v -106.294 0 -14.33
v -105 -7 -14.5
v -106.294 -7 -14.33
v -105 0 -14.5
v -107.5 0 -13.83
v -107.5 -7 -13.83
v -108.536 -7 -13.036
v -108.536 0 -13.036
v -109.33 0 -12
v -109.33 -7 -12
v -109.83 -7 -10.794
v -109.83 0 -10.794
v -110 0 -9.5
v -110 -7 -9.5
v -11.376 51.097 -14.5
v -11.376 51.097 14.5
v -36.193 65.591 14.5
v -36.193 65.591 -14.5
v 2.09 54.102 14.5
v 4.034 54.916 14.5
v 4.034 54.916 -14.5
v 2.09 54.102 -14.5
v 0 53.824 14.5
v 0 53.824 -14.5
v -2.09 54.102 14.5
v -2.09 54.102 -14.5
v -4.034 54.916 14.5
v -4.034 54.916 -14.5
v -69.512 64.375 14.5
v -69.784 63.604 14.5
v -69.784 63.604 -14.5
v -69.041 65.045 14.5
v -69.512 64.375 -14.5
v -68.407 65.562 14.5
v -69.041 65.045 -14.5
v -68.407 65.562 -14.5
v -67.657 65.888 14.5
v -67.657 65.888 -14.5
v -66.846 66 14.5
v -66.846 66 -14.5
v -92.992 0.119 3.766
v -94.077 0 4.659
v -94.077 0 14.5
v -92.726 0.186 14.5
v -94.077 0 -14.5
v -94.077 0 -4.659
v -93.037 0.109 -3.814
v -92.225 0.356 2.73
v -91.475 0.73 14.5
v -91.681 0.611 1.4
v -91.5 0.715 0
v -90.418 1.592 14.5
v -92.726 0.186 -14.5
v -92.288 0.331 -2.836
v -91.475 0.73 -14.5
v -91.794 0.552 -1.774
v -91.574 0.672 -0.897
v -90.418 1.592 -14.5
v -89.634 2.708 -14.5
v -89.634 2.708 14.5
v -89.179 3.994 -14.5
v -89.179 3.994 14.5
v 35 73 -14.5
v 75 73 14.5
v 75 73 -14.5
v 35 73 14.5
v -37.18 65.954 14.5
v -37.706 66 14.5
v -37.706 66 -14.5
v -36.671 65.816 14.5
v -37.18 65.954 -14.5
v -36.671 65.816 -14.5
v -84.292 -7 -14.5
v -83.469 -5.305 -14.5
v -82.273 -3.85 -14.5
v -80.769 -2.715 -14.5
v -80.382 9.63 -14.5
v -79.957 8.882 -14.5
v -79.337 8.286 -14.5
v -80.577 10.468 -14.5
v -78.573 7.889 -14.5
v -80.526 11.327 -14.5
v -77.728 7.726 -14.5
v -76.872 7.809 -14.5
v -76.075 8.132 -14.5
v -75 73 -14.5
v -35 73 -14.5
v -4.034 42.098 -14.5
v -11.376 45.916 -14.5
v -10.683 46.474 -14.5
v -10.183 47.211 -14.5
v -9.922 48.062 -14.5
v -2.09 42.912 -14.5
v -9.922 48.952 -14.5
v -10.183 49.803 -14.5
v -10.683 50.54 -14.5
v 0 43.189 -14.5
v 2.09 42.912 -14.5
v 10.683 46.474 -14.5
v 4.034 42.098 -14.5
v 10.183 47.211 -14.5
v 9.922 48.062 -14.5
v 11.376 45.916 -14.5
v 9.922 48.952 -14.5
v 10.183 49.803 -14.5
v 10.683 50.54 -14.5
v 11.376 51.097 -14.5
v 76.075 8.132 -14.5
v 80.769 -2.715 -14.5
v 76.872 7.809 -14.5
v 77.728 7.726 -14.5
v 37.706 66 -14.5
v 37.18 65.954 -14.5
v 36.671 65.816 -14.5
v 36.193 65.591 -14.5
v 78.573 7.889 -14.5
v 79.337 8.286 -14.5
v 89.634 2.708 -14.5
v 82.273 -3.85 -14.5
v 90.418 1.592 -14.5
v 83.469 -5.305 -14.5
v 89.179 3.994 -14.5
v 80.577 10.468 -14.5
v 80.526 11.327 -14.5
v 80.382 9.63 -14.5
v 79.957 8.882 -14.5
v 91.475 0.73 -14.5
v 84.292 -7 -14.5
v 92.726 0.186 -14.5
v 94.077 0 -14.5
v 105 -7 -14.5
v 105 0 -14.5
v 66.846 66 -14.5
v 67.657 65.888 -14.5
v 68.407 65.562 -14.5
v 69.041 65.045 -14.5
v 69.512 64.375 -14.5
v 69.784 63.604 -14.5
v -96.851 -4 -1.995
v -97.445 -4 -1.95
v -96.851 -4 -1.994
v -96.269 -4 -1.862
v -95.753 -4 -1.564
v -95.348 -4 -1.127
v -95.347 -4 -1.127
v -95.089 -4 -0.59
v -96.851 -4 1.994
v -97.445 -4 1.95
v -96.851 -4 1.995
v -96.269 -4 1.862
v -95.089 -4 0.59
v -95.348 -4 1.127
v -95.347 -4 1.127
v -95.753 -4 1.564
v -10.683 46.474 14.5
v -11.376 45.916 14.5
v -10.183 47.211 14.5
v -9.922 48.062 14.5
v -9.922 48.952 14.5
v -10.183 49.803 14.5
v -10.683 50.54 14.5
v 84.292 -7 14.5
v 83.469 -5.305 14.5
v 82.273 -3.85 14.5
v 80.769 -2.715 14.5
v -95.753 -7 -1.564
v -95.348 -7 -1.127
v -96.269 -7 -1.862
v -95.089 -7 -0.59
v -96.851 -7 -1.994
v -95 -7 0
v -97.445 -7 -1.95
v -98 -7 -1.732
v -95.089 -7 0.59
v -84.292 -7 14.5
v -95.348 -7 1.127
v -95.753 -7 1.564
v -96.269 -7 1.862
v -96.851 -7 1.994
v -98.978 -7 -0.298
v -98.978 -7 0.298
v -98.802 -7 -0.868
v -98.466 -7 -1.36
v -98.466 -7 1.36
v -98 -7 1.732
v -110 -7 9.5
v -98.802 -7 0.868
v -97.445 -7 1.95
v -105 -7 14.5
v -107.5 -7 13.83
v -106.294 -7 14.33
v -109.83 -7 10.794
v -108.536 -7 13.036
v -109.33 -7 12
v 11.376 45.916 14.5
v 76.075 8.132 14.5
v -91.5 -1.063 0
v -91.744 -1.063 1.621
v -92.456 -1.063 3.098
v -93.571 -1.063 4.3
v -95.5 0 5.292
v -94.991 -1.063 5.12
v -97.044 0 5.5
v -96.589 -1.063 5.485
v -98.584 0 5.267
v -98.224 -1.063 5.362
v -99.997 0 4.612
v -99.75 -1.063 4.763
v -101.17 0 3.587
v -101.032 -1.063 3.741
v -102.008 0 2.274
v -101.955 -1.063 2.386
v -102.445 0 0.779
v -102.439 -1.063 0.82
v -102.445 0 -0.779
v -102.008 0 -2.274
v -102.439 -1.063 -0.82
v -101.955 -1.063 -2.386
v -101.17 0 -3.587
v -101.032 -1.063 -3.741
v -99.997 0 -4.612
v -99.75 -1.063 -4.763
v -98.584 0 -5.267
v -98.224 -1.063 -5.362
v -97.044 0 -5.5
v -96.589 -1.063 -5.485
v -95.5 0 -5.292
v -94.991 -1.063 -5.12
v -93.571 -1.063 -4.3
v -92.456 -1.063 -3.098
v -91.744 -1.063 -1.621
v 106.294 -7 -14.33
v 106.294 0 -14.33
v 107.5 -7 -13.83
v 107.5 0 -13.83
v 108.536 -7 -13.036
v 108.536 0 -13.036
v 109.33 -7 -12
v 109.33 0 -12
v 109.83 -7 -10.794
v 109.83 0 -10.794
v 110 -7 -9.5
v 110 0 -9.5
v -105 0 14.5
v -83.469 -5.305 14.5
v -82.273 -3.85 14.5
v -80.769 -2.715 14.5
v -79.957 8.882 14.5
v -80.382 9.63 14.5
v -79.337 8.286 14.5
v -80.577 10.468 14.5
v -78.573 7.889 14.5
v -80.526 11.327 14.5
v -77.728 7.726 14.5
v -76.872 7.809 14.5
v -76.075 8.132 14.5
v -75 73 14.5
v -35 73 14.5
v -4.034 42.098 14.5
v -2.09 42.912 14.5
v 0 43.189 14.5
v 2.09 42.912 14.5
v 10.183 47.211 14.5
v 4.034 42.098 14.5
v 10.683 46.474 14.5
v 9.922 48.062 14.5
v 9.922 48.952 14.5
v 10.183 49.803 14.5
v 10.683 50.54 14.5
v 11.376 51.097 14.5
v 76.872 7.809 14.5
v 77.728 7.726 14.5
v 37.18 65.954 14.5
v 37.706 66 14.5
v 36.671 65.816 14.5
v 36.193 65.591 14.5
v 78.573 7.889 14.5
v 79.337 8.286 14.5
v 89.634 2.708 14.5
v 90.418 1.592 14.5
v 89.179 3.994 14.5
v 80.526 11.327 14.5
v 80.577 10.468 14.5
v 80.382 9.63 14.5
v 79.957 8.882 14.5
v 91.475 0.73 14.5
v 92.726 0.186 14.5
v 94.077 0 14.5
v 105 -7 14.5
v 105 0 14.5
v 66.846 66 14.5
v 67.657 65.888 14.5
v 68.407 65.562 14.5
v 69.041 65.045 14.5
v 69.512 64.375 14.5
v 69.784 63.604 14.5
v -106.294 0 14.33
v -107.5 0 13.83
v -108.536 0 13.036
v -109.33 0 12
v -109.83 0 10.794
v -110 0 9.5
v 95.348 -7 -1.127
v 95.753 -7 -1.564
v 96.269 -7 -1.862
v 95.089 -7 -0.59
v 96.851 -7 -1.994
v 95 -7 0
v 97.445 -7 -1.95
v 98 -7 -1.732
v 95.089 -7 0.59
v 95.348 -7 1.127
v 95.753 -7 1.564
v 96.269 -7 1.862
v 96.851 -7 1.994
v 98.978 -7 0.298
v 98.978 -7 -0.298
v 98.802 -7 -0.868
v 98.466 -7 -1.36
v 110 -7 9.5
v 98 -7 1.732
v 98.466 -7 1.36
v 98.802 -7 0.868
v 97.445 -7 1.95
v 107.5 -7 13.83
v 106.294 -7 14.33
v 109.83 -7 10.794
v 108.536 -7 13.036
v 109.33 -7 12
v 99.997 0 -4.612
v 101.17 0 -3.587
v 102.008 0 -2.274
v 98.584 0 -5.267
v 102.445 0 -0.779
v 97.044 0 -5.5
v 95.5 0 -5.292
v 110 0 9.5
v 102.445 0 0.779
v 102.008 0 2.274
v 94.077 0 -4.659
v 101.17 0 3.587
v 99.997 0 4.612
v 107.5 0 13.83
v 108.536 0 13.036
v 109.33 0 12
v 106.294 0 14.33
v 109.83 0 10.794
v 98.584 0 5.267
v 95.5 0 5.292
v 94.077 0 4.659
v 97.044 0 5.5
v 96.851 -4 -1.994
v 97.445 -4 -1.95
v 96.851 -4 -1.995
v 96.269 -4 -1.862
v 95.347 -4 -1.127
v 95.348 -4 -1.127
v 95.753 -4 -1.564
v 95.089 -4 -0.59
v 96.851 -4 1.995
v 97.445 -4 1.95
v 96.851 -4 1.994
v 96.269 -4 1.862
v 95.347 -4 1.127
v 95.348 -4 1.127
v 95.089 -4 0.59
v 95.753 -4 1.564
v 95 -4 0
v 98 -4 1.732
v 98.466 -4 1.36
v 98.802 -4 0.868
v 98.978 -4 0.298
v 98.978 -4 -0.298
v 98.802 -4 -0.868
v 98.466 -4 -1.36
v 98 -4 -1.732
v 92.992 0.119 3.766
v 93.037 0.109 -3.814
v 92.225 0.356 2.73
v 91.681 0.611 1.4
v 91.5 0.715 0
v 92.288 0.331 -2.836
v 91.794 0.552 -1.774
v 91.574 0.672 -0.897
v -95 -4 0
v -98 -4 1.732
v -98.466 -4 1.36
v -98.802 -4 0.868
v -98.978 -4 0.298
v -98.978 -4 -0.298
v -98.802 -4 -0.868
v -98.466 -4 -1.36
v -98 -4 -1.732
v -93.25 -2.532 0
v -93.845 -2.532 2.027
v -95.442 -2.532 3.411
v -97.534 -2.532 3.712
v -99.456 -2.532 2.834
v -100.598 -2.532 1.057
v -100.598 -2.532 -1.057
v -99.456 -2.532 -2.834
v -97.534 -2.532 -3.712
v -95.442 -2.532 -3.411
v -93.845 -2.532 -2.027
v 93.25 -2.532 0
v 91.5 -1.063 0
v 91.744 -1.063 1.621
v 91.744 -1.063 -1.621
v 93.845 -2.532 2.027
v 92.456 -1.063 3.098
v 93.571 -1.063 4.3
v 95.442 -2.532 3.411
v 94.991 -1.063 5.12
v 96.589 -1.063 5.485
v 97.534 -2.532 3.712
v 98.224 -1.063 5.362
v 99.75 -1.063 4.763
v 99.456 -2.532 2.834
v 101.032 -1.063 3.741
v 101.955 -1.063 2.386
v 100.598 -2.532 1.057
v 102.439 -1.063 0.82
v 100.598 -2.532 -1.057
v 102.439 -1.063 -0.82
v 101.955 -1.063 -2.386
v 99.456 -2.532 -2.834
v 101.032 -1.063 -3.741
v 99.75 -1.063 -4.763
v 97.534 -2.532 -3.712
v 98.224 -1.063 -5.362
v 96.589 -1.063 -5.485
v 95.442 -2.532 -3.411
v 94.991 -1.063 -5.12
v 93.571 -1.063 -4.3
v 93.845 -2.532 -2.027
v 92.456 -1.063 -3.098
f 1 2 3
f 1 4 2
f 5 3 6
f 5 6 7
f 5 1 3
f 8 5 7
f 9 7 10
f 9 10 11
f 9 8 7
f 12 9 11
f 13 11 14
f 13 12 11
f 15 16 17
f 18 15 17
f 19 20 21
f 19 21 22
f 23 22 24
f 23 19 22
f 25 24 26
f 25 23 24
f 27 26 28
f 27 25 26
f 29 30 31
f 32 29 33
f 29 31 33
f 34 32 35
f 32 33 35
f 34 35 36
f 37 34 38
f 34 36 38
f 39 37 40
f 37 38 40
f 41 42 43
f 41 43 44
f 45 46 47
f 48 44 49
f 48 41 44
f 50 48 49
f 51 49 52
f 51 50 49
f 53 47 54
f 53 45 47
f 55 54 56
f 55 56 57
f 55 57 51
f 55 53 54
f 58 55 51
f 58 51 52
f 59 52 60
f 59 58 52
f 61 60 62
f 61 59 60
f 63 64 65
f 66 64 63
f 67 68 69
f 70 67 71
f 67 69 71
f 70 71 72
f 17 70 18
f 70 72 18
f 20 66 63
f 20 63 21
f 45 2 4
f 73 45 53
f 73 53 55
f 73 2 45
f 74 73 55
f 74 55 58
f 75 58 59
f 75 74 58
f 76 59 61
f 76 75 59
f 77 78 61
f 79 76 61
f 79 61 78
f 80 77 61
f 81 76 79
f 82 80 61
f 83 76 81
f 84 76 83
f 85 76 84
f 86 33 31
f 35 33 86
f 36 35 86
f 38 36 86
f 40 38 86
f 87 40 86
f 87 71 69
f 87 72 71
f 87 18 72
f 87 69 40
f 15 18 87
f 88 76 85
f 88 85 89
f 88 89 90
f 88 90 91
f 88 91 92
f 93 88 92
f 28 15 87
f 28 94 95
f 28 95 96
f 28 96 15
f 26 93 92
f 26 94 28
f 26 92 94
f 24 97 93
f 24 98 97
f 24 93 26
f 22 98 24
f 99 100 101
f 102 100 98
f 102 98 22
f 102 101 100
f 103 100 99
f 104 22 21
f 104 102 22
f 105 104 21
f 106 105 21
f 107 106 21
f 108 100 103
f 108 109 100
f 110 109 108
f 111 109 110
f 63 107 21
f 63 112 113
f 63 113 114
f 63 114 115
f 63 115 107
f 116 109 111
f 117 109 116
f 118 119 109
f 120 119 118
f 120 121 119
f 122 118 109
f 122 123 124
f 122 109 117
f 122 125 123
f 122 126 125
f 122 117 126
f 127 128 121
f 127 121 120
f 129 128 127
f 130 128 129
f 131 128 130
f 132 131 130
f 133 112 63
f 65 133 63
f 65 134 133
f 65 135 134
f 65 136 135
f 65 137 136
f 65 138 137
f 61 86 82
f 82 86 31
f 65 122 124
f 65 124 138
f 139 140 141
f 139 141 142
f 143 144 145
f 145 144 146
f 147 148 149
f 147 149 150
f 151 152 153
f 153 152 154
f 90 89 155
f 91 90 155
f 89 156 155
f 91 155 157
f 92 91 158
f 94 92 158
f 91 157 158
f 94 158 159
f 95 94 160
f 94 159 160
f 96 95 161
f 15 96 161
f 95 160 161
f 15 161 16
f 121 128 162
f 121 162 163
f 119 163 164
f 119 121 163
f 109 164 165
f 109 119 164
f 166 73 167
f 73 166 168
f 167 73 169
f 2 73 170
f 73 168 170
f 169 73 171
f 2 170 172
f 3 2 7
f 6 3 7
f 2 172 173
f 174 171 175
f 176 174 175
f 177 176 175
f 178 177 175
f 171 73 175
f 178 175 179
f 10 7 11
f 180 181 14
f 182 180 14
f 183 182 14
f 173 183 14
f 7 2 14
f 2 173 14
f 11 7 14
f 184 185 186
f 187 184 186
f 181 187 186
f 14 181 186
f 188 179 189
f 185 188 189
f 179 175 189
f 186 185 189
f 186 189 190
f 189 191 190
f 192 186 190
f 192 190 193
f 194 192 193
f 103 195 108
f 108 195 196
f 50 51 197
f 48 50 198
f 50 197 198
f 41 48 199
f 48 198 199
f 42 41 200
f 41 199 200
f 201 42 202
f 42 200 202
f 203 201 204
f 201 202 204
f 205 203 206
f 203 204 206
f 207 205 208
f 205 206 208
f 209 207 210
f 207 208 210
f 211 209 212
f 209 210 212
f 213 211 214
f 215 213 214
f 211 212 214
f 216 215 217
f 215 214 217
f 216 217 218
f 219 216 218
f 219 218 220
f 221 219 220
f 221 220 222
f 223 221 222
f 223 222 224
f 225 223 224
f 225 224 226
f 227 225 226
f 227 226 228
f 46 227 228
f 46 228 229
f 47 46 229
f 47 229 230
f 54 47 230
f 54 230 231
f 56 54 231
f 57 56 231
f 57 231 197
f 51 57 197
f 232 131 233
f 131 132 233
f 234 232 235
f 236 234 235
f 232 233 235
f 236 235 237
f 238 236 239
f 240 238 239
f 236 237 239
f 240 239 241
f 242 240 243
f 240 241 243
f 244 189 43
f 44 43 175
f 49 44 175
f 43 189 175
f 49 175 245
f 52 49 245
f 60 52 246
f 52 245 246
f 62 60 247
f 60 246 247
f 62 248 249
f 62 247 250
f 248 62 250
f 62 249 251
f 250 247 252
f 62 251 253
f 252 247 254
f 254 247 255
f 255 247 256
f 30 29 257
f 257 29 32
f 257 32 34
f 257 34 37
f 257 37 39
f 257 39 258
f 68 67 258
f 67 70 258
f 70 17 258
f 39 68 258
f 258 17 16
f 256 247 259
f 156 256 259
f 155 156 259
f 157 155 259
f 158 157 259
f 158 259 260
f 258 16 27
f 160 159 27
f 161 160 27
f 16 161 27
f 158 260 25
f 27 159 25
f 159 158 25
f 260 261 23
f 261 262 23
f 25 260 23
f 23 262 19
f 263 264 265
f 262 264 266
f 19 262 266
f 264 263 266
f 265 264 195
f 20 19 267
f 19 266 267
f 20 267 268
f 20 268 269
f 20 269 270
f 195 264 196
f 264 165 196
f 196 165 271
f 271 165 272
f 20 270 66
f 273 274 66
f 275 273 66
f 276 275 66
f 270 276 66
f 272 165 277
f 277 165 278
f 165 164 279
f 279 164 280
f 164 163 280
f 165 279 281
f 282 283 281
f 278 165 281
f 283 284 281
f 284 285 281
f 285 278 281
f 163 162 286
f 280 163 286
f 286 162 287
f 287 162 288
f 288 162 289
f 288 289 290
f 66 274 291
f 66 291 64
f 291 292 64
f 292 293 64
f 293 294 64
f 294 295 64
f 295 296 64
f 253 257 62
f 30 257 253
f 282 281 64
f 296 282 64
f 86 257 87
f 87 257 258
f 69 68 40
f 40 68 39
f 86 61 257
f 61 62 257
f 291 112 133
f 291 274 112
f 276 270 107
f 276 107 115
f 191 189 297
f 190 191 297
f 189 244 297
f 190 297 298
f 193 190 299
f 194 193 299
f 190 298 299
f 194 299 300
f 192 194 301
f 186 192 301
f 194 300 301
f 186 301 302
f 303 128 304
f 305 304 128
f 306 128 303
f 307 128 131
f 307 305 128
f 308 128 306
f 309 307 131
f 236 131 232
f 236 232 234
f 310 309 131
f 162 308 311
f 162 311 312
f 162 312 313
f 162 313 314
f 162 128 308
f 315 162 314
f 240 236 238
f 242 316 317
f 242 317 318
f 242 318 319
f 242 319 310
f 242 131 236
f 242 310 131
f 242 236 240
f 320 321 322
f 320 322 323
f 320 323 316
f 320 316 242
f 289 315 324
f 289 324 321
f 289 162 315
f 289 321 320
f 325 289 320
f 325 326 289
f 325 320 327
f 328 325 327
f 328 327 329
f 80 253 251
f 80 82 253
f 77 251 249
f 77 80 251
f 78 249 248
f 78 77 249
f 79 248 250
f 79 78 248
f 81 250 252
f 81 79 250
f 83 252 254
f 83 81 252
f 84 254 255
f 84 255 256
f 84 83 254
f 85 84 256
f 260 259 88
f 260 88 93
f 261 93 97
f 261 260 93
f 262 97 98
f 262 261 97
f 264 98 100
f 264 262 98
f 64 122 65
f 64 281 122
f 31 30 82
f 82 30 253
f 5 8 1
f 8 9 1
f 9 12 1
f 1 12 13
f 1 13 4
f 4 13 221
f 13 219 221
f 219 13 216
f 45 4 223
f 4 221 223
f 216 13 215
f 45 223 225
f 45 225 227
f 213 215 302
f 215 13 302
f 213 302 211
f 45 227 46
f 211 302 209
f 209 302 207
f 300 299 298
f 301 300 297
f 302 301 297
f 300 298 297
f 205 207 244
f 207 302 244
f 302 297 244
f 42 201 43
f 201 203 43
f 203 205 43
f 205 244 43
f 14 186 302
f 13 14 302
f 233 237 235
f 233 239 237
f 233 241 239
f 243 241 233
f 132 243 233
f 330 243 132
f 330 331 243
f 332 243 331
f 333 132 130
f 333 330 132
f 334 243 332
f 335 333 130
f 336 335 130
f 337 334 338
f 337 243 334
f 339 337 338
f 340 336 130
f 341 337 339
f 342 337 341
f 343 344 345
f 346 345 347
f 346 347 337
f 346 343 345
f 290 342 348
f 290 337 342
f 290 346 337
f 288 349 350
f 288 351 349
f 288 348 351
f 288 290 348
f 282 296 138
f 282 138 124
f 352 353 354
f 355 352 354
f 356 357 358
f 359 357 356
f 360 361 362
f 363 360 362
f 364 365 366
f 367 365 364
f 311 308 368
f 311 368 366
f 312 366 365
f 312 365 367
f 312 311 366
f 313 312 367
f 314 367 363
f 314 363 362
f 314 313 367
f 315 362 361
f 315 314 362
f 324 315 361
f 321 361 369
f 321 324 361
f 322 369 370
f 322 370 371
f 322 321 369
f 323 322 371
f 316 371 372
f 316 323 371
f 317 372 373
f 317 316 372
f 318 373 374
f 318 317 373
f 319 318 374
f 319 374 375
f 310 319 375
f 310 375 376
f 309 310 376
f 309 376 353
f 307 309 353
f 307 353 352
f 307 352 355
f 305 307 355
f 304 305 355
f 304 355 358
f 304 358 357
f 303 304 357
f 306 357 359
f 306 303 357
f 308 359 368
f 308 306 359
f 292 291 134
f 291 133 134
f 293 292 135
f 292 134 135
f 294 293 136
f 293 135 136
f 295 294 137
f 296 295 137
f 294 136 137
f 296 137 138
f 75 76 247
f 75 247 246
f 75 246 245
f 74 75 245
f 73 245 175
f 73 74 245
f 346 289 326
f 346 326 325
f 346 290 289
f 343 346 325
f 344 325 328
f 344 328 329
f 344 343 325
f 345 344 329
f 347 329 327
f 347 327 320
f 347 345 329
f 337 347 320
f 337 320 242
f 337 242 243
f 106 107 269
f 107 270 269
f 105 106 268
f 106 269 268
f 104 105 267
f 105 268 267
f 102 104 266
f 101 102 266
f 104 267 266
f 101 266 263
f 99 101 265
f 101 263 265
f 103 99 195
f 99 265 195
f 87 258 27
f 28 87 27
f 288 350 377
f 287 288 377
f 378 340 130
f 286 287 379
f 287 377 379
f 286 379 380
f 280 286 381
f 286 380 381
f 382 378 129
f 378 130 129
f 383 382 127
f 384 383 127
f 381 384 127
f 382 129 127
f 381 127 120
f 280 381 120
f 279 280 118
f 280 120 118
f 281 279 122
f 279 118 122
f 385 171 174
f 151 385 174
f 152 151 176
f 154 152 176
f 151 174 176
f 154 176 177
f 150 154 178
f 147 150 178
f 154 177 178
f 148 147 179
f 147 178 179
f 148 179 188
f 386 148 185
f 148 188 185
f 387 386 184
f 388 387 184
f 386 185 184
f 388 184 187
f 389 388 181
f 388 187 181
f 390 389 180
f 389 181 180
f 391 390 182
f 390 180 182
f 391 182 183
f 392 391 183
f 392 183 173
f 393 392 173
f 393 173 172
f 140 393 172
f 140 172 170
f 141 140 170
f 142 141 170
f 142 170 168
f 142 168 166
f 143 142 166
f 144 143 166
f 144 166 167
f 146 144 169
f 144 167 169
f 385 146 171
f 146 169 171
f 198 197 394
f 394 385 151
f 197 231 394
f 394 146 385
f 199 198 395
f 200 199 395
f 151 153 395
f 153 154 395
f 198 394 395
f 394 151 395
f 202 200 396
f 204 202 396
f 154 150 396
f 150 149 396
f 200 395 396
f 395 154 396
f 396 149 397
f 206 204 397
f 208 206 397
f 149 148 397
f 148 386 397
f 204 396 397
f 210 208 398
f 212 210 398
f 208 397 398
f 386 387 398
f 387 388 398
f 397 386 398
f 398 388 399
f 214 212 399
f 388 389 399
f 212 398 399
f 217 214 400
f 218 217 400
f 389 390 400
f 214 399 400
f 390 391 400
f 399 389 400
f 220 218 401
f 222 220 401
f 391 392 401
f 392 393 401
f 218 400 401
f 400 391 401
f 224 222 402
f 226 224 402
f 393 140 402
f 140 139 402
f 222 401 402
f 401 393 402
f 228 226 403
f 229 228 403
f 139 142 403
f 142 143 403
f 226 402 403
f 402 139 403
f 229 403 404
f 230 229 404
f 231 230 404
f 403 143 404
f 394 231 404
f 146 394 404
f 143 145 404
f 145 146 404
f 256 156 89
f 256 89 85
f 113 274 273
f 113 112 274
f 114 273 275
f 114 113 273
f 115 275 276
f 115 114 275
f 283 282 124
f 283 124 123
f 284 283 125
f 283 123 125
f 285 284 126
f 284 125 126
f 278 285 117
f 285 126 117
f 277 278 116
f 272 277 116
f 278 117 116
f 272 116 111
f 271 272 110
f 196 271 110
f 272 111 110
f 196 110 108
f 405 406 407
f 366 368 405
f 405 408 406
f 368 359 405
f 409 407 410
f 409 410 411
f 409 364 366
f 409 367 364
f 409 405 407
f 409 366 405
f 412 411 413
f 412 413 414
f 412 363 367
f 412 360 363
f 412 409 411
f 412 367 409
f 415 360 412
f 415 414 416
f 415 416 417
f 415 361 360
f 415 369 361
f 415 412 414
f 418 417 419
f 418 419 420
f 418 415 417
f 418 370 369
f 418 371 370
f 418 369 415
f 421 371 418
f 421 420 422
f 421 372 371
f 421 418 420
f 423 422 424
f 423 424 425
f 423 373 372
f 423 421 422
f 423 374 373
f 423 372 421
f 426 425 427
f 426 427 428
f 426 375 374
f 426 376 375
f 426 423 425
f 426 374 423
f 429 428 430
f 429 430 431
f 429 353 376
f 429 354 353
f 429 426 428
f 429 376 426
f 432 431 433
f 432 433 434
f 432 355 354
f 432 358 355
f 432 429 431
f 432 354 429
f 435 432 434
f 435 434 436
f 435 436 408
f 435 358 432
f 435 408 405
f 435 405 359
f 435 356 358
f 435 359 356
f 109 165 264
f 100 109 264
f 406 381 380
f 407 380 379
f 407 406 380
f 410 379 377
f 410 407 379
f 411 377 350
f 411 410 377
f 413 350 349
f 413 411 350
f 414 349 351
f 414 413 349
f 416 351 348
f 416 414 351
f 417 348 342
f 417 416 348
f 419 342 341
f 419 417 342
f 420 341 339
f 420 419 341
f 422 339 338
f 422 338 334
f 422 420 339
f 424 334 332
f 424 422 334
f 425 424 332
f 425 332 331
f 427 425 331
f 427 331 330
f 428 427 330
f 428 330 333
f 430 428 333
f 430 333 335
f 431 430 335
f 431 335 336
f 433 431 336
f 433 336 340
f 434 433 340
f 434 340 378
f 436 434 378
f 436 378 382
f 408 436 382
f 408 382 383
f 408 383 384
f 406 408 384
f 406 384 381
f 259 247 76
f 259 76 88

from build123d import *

# Parameters (mm, degrees)
EXTRU_MINCE1_DEPTH      = 14.5
CONG_1_R                = 5
CONG_2_R                = 5
ESQUISSE4_R             = 2
ENL_V_MAT_EXTRU_1_DEPTH = 3
ESQUISSE5_R             = 5.5
ENL_V_MAT_EXTRU_2_DEPTH = 136.052767465
CHANFREIN1_SIZE2        = 3.5
CHANFREIN1_SIZE         = 2.936848709
CONG_3_R                = 8
CONG_4_R                = 3


# Some blends are built 0.0001 mm under size
with BuildPart() as part:
    # Esquisse1 → Extru.-Mince1 (new, symmetric)
    with BuildSketch(Plane.XY):
        Polygon((-110, 0), (-90, 0), (-75, 73), (-35, 73), (90, 0), (86.469896568, -6.044697657), (-36.894311748, 66), (-69.292107606, 66), (-84.292107606, -7), (-110, -7), align=None)
    extrude(amount=EXTRU_MINCE1_DEPTH, both=True)

    # Congé1
    cong_1_edges = [part.edges().sort_by_distance(p)[0] for p in [
        (-110, -3.5, 14.5),
        (-110, -3.5, -14.5),
    ]]
    fillet(cong_1_edges, radius=CONG_1_R)

    # Congé2
    cong_2_edges = [part.edges().sort_by_distance(p)[0] for p in [
        (-90, 0, 0),
    ]]
    fillet(cong_2_edges, radius=CONG_2_R)

    # Esquisse4 → Enlèv. mat.-Extru.1 (cut)
    with BuildSketch(Plane.XZ.offset(7)):
        with Locations((-97, 0)):
            Circle(ESQUISSE4_R)
    extrude(amount=-ENL_V_MAT_EXTRU_1_DEPTH, mode=Mode.SUBTRACT)

    # Esquisse5 → Enlèv. mat.-Extru.2 (cut, through all)
    with BuildSketch(Plane.XZ.offset(4)):
        with Locations((-97, 0)):
            Circle(ESQUISSE5_R)
    extrude(amount=-ENL_V_MAT_EXTRU_2_DEPTH, mode=Mode.SUBTRACT)

    # Chanfrein1
    chanfrein1_edges = [part.edges().sort_by_distance(p)[0] for p in [
        (-102.5, -4, 0),
    ]]
    chanfrein1_side = [part.faces().sort_by_distance(p)[0] for p in [
        (-102.5, -3.941263026, 0),
    ]]
    chamfer(chanfrein1_edges, length=CHANFREIN1_SIZE - 0.0001, length2=CHANFREIN1_SIZE2 - 0.0001, reference=chanfrein1_side[0])  # a hair under: the kernel refuses the full size

    # Symétrie1: part across plane


with BuildPart() as part_1:
    add(part.part)
    add(part.part.mirror(Plane(origin=(0, 0, 0), x_dir=(0, 0, 1), z_dir=(1, 0, 0))))

    # Congé3
    # the kernel refuses this fillet: 8 mm, written as the material it adds along each edge
    with BuildSketch(Plane(origin=(0, 52.56, 14.5), x_dir=(-0.8635282366882334, 0.504300490225927, 0), z_dir=(0, 0, -1))) as cong_3_piece_1:
        with BuildLine():
            CenterArc((CONG_3_R * 0.584, CONG_3_R), CONG_3_R, 209.430143301, 60.569856699)
            Line((-CONG_3_R * 0.286955426172, CONG_3_R * 0.508637968884), (-CONG_3_R * 0.304374534695, CONG_3_R * 0.498810728262))
            Line((-CONG_3_R * 0.304374534695, CONG_3_R * 0.498810728262), (-CONG_3_R * 0.01168, -CONG_3_R * 0.02))
            Line((-CONG_3_R * 0.01168, -CONG_3_R * 0.02), (CONG_3_R * 0.584, -CONG_3_R * 0.02))
            Line((CONG_3_R * 0.584, -CONG_3_R * 0.02), (CONG_3_R * 0.584, 0))
        make_face()
    extrude(amount=29)
    with BuildSketch(Plane(origin=(0, 44.453721939, 14.5), x_dir=(-0.8635282366882323, -0.5043004902259292, 0), z_dir=(0, 0, -1))) as cong_3_piece_2:
        with BuildLine():
            CenterArc((CONG_3_R * 0.584, -CONG_3_R), CONG_3_R, 90, 60.569856699)
            Line((-CONG_3_R * 0.286955426172, -CONG_3_R * 0.508637968884), (-CONG_3_R * 0.304374534695, -CONG_3_R * 0.498810728262))
            Line((-CONG_3_R * 0.304374534695, -CONG_3_R * 0.498810728262), (-CONG_3_R * 0.01168, CONG_3_R * 0.02))
            Line((-CONG_3_R * 0.01168, CONG_3_R * 0.02), (CONG_3_R * 0.584, CONG_3_R * 0.02))
            Line((CONG_3_R * 0.584, CONG_3_R * 0.02), (CONG_3_R * 0.584, 0))
        make_face()
    extrude(amount=29)
    with BuildSketch(Plane(origin=(83.772073882, -4.469169208, -14.5), x_dir=(-0.8635282366882329, 0.504300490225928, 0), z_dir=(0, 0, 1))) as cong_3_piece_3:
        with BuildLine():
            CenterArc((3.477750225, 8), CONG_3_R, 229.429051082, 40.570948918)
            Line((-1.725363014, 1.923190589), (-1.829425279, 1.801654401))
            ThreePointArc((-1.829425279, 1.801654401), (-0.981778041, 0.854749538), (-0.119096533, -0.106845757))
            Line((-0.119096533, -0.106845757), (0, -0.16))
            Line((0, -0.16), (3.477750225, -0.16))
            Line((3.477750225, -0.16), (3.477750225, 0))
        make_face()
    extrude(amount=29)
    with BuildSketch(Plane(origin=(-83.772073882, -4.469169208, -14.5), x_dir=(-0.20127429834952004, -0.979534918634302, 0), z_dir=(0, 0, 1))) as cong_3_piece_4:
        with BuildLine():
            CenterArc((3.632433829, 7.930962811), CONG_3_R, 221.896414773, 40.570948918)
            Line((-2.322392841, 2.588674974), (-2.441489374, 2.481829217))
            Line((-2.441489374, 2.481829217), (-0.119096533, -0.106845757))
            Line((-0.119096533, -0.106845757), (0, -0.16))
            ThreePointArc((0, -0.16), (1.291853279, -0.16), (2.562732012, -0.158619256))
            Line((2.562732012, -0.158619256), (2.583706557, 0))
        make_face()
    extrude(amount=29)

    # Congé4
    cong_4_edges = [part_1.edges().sort_by_distance(p)[0] for p in [
        (-36.894311748, 66, 0),
        (-69.292107606, 66, 0),
        (6.940306559, 48.50686097, 0),
        (-6.940306559, 48.50686097, 0),
        (81.879263002, 4.742510407, 0),
        (-81.879263002, 4.742510407, 0),
        (69.292107606, 66, 0),
        (36.894311748, 66, 0),
    ]]
    fillet(cong_4_edges, radius=CONG_4_R)


solid = part_1.part
